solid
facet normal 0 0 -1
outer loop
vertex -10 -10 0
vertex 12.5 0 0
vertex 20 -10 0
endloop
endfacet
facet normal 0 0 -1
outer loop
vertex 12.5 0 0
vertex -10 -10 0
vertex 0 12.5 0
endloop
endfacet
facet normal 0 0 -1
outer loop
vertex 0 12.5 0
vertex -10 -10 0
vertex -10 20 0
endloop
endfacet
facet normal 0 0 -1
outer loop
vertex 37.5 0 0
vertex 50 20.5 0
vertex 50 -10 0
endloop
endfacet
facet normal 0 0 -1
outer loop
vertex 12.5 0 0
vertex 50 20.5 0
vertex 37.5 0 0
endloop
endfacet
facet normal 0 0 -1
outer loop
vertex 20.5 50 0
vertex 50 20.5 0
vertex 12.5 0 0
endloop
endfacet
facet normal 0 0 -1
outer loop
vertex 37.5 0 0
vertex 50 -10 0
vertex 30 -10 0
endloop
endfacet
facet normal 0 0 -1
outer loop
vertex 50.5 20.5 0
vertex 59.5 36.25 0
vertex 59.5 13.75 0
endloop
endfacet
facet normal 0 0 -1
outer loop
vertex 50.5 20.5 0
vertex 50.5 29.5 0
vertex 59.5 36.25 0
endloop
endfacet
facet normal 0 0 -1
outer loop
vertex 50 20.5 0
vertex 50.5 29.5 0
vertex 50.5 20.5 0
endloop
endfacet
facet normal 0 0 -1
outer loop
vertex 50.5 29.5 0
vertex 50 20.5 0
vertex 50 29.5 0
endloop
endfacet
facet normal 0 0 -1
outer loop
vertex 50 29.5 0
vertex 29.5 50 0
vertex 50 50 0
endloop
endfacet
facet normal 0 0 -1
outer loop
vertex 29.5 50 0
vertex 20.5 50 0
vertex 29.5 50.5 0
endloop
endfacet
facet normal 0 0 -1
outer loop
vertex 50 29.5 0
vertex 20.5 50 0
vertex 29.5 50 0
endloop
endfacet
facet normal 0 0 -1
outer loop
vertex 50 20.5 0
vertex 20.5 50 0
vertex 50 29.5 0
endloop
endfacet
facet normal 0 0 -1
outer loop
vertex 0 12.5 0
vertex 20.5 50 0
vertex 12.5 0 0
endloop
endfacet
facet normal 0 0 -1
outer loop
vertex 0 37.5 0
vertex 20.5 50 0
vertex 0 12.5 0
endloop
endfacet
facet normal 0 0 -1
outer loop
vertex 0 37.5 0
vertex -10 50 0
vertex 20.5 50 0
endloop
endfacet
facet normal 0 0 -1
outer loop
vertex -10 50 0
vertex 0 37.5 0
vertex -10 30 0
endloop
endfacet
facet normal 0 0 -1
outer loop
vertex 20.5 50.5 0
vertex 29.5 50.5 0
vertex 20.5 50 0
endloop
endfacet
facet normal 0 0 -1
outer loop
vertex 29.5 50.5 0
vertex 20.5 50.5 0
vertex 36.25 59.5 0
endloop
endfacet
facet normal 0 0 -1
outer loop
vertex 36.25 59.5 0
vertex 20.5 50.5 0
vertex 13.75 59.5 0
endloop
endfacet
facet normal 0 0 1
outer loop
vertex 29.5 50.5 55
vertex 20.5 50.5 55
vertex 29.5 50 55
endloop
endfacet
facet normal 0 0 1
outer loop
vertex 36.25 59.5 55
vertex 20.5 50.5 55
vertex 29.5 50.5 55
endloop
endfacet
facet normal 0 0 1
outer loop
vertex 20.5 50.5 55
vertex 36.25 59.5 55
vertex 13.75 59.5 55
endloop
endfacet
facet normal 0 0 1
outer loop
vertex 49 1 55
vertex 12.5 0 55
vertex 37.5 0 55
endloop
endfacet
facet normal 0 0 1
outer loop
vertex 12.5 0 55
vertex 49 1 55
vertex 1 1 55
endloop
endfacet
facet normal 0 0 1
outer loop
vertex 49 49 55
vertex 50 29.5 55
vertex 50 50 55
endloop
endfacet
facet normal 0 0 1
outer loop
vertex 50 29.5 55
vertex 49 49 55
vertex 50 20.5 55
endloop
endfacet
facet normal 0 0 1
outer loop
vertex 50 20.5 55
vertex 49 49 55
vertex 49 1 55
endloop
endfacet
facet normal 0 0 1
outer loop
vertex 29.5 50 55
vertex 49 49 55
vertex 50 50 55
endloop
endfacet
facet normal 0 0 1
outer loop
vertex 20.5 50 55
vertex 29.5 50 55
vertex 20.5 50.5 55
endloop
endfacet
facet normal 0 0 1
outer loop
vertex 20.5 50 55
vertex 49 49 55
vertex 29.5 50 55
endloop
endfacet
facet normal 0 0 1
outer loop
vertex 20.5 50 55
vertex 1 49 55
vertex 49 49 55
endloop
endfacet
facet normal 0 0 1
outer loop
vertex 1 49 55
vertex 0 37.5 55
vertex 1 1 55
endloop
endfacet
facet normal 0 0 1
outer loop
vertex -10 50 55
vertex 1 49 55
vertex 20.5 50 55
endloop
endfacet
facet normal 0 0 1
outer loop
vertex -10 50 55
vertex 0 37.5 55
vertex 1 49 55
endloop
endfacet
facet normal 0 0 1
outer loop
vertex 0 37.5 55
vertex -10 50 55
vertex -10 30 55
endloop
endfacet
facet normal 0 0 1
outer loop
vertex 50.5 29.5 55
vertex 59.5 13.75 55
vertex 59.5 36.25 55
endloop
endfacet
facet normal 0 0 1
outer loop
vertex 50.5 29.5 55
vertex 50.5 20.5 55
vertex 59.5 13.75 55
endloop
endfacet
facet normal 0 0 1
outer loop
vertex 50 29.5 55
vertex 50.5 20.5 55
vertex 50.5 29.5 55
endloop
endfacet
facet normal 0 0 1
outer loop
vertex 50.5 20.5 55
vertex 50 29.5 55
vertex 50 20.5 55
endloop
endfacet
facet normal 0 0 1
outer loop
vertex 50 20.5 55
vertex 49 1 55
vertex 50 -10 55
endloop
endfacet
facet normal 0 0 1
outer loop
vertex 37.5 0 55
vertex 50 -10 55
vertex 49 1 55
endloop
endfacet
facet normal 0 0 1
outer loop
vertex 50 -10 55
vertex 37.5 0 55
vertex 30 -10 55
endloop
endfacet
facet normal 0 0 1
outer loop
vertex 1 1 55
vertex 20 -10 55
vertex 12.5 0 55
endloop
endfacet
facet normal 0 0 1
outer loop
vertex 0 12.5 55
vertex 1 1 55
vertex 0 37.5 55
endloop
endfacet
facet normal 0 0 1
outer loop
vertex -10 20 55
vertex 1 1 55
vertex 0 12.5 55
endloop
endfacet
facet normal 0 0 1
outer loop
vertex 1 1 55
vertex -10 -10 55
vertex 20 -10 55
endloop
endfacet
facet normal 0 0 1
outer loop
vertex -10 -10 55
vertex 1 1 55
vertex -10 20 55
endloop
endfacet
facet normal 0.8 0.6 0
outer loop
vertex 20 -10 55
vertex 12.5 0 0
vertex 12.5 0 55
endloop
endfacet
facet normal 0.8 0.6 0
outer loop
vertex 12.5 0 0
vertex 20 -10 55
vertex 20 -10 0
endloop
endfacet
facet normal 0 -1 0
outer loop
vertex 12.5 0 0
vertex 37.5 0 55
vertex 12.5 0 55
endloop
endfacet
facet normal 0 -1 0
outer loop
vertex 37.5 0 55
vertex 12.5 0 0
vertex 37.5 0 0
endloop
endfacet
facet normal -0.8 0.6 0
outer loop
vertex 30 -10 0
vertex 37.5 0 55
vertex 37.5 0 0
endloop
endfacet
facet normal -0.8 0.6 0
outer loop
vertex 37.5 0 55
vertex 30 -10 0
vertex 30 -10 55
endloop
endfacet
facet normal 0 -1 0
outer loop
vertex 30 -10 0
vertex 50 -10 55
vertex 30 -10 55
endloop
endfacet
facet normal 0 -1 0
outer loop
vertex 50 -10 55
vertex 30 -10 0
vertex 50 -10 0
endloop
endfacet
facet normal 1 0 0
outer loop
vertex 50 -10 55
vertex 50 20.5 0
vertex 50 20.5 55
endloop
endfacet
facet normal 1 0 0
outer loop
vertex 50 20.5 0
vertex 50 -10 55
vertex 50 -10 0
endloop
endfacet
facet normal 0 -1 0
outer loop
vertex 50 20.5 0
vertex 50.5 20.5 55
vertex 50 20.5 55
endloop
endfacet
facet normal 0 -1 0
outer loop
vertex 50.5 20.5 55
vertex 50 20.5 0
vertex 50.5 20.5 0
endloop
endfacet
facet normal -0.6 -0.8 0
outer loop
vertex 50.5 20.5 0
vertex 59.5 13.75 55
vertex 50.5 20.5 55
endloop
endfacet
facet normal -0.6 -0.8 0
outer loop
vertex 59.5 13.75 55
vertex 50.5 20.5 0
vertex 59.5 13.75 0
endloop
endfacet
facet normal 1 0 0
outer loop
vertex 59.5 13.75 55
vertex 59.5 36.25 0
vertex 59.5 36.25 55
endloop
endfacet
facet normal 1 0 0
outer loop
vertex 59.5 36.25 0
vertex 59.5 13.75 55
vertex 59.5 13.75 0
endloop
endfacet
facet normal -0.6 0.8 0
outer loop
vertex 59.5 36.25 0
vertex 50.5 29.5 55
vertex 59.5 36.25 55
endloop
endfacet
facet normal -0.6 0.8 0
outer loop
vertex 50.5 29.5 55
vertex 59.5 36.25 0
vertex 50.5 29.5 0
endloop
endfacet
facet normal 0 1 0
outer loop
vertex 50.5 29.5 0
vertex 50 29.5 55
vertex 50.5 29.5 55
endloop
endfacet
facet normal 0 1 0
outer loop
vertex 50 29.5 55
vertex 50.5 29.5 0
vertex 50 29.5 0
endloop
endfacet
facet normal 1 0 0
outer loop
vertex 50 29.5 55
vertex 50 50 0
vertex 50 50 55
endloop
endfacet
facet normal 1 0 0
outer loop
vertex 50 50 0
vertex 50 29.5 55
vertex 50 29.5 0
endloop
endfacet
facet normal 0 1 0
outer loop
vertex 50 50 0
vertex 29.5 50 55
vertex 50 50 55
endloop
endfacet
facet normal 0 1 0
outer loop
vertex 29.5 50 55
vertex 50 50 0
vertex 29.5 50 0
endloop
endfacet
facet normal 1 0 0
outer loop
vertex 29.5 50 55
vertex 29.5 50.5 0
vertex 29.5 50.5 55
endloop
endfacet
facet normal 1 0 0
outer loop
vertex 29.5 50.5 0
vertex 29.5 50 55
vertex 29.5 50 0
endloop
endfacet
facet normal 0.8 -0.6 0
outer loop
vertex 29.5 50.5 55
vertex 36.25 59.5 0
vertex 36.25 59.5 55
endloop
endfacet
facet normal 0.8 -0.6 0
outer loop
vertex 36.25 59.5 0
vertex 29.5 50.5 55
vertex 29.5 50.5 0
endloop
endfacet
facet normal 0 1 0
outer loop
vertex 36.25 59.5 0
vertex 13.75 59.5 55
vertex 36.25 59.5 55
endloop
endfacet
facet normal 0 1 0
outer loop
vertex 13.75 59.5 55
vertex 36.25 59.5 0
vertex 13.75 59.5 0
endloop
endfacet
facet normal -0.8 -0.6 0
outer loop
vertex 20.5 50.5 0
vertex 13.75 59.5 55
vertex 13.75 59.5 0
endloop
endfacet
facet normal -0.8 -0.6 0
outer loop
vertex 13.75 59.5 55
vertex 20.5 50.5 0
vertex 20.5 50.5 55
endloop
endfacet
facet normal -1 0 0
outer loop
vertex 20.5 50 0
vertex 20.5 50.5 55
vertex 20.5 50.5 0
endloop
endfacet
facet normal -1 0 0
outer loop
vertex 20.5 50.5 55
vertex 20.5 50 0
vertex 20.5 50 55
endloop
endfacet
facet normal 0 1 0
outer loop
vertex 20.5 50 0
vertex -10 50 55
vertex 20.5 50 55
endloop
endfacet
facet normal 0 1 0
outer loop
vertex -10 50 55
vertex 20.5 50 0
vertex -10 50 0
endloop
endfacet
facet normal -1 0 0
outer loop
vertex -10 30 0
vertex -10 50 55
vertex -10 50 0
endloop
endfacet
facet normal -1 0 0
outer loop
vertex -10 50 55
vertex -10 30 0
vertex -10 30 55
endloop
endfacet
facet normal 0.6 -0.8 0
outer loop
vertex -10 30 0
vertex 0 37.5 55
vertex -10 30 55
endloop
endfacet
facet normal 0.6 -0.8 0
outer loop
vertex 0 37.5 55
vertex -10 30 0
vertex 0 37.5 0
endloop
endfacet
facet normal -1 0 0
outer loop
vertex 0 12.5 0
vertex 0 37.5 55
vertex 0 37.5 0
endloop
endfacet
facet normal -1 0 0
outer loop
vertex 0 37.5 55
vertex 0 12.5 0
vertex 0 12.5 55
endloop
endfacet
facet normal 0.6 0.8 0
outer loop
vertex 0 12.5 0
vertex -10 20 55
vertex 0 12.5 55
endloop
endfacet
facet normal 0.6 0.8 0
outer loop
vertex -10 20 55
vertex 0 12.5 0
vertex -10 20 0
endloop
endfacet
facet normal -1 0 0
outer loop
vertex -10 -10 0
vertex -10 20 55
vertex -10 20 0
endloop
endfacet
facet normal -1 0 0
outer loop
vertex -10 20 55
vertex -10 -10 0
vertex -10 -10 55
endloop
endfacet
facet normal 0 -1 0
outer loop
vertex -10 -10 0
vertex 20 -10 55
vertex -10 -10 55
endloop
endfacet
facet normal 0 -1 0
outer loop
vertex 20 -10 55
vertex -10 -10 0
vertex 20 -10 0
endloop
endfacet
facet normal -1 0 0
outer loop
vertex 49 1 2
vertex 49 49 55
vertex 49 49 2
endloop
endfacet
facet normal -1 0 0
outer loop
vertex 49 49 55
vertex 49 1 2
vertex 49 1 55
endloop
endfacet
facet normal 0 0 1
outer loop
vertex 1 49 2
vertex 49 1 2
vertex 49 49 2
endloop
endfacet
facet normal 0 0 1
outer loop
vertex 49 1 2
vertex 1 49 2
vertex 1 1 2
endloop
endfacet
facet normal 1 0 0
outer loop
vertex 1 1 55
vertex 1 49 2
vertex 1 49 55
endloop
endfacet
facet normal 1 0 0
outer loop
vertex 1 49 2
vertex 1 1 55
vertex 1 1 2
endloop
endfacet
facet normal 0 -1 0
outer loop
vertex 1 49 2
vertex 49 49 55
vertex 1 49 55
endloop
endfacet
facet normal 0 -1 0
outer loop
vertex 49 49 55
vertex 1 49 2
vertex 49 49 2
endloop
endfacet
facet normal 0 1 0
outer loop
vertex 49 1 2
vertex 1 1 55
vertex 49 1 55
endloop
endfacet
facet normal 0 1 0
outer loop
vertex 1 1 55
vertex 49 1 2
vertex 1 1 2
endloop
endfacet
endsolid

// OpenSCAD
//Dovetail connection modular boxes.
module connector(){
	polygon(points=[[-5,-0.1],[-5,0],[-12.5,10],[12.5,10],[12.5,10],[5,0],[5,-0.1]]);
}
module boxbase_(){
	translate([25,25]) difference(){
		union(){
			square([50,50],center=true);
			for(i=[0,1]) rotate([0,0,-90*i]) union(){
				translate([0,-30]) square([50,10],center=true);
				translate([0,25+0.5]) scale(0.9){
					connector();
					square([10,5],center=true);
				}
			}
		}
		for(i=[0,1]) rotate([0,0,-90*i]) translate([0,-35]) connector();
	}
	translate([-10,-10]) square([10,10]);
}
module boxbase(x=1,y=1){
	for(xn=[0:x-1]) for(yn=[0:y-1]) translate([xn,yn]*50) boxbase_();
}
module box(h=55,x=1,y=1){
	linear_extrude(height=h) boxbase(x=x,y=y);
}
module stuffbox(h=55,x=1,y=1){
	difference(){
		box(h=h,x=x,y=y);
		translate([1,1,2]) cube([50*x-2,50*x-2,h]);
	}
}
stuffbox();
//for(x=[0:]) for(y=[0:1]) translate([60*x,60*y,(x+y)*10]) stuffbox();
